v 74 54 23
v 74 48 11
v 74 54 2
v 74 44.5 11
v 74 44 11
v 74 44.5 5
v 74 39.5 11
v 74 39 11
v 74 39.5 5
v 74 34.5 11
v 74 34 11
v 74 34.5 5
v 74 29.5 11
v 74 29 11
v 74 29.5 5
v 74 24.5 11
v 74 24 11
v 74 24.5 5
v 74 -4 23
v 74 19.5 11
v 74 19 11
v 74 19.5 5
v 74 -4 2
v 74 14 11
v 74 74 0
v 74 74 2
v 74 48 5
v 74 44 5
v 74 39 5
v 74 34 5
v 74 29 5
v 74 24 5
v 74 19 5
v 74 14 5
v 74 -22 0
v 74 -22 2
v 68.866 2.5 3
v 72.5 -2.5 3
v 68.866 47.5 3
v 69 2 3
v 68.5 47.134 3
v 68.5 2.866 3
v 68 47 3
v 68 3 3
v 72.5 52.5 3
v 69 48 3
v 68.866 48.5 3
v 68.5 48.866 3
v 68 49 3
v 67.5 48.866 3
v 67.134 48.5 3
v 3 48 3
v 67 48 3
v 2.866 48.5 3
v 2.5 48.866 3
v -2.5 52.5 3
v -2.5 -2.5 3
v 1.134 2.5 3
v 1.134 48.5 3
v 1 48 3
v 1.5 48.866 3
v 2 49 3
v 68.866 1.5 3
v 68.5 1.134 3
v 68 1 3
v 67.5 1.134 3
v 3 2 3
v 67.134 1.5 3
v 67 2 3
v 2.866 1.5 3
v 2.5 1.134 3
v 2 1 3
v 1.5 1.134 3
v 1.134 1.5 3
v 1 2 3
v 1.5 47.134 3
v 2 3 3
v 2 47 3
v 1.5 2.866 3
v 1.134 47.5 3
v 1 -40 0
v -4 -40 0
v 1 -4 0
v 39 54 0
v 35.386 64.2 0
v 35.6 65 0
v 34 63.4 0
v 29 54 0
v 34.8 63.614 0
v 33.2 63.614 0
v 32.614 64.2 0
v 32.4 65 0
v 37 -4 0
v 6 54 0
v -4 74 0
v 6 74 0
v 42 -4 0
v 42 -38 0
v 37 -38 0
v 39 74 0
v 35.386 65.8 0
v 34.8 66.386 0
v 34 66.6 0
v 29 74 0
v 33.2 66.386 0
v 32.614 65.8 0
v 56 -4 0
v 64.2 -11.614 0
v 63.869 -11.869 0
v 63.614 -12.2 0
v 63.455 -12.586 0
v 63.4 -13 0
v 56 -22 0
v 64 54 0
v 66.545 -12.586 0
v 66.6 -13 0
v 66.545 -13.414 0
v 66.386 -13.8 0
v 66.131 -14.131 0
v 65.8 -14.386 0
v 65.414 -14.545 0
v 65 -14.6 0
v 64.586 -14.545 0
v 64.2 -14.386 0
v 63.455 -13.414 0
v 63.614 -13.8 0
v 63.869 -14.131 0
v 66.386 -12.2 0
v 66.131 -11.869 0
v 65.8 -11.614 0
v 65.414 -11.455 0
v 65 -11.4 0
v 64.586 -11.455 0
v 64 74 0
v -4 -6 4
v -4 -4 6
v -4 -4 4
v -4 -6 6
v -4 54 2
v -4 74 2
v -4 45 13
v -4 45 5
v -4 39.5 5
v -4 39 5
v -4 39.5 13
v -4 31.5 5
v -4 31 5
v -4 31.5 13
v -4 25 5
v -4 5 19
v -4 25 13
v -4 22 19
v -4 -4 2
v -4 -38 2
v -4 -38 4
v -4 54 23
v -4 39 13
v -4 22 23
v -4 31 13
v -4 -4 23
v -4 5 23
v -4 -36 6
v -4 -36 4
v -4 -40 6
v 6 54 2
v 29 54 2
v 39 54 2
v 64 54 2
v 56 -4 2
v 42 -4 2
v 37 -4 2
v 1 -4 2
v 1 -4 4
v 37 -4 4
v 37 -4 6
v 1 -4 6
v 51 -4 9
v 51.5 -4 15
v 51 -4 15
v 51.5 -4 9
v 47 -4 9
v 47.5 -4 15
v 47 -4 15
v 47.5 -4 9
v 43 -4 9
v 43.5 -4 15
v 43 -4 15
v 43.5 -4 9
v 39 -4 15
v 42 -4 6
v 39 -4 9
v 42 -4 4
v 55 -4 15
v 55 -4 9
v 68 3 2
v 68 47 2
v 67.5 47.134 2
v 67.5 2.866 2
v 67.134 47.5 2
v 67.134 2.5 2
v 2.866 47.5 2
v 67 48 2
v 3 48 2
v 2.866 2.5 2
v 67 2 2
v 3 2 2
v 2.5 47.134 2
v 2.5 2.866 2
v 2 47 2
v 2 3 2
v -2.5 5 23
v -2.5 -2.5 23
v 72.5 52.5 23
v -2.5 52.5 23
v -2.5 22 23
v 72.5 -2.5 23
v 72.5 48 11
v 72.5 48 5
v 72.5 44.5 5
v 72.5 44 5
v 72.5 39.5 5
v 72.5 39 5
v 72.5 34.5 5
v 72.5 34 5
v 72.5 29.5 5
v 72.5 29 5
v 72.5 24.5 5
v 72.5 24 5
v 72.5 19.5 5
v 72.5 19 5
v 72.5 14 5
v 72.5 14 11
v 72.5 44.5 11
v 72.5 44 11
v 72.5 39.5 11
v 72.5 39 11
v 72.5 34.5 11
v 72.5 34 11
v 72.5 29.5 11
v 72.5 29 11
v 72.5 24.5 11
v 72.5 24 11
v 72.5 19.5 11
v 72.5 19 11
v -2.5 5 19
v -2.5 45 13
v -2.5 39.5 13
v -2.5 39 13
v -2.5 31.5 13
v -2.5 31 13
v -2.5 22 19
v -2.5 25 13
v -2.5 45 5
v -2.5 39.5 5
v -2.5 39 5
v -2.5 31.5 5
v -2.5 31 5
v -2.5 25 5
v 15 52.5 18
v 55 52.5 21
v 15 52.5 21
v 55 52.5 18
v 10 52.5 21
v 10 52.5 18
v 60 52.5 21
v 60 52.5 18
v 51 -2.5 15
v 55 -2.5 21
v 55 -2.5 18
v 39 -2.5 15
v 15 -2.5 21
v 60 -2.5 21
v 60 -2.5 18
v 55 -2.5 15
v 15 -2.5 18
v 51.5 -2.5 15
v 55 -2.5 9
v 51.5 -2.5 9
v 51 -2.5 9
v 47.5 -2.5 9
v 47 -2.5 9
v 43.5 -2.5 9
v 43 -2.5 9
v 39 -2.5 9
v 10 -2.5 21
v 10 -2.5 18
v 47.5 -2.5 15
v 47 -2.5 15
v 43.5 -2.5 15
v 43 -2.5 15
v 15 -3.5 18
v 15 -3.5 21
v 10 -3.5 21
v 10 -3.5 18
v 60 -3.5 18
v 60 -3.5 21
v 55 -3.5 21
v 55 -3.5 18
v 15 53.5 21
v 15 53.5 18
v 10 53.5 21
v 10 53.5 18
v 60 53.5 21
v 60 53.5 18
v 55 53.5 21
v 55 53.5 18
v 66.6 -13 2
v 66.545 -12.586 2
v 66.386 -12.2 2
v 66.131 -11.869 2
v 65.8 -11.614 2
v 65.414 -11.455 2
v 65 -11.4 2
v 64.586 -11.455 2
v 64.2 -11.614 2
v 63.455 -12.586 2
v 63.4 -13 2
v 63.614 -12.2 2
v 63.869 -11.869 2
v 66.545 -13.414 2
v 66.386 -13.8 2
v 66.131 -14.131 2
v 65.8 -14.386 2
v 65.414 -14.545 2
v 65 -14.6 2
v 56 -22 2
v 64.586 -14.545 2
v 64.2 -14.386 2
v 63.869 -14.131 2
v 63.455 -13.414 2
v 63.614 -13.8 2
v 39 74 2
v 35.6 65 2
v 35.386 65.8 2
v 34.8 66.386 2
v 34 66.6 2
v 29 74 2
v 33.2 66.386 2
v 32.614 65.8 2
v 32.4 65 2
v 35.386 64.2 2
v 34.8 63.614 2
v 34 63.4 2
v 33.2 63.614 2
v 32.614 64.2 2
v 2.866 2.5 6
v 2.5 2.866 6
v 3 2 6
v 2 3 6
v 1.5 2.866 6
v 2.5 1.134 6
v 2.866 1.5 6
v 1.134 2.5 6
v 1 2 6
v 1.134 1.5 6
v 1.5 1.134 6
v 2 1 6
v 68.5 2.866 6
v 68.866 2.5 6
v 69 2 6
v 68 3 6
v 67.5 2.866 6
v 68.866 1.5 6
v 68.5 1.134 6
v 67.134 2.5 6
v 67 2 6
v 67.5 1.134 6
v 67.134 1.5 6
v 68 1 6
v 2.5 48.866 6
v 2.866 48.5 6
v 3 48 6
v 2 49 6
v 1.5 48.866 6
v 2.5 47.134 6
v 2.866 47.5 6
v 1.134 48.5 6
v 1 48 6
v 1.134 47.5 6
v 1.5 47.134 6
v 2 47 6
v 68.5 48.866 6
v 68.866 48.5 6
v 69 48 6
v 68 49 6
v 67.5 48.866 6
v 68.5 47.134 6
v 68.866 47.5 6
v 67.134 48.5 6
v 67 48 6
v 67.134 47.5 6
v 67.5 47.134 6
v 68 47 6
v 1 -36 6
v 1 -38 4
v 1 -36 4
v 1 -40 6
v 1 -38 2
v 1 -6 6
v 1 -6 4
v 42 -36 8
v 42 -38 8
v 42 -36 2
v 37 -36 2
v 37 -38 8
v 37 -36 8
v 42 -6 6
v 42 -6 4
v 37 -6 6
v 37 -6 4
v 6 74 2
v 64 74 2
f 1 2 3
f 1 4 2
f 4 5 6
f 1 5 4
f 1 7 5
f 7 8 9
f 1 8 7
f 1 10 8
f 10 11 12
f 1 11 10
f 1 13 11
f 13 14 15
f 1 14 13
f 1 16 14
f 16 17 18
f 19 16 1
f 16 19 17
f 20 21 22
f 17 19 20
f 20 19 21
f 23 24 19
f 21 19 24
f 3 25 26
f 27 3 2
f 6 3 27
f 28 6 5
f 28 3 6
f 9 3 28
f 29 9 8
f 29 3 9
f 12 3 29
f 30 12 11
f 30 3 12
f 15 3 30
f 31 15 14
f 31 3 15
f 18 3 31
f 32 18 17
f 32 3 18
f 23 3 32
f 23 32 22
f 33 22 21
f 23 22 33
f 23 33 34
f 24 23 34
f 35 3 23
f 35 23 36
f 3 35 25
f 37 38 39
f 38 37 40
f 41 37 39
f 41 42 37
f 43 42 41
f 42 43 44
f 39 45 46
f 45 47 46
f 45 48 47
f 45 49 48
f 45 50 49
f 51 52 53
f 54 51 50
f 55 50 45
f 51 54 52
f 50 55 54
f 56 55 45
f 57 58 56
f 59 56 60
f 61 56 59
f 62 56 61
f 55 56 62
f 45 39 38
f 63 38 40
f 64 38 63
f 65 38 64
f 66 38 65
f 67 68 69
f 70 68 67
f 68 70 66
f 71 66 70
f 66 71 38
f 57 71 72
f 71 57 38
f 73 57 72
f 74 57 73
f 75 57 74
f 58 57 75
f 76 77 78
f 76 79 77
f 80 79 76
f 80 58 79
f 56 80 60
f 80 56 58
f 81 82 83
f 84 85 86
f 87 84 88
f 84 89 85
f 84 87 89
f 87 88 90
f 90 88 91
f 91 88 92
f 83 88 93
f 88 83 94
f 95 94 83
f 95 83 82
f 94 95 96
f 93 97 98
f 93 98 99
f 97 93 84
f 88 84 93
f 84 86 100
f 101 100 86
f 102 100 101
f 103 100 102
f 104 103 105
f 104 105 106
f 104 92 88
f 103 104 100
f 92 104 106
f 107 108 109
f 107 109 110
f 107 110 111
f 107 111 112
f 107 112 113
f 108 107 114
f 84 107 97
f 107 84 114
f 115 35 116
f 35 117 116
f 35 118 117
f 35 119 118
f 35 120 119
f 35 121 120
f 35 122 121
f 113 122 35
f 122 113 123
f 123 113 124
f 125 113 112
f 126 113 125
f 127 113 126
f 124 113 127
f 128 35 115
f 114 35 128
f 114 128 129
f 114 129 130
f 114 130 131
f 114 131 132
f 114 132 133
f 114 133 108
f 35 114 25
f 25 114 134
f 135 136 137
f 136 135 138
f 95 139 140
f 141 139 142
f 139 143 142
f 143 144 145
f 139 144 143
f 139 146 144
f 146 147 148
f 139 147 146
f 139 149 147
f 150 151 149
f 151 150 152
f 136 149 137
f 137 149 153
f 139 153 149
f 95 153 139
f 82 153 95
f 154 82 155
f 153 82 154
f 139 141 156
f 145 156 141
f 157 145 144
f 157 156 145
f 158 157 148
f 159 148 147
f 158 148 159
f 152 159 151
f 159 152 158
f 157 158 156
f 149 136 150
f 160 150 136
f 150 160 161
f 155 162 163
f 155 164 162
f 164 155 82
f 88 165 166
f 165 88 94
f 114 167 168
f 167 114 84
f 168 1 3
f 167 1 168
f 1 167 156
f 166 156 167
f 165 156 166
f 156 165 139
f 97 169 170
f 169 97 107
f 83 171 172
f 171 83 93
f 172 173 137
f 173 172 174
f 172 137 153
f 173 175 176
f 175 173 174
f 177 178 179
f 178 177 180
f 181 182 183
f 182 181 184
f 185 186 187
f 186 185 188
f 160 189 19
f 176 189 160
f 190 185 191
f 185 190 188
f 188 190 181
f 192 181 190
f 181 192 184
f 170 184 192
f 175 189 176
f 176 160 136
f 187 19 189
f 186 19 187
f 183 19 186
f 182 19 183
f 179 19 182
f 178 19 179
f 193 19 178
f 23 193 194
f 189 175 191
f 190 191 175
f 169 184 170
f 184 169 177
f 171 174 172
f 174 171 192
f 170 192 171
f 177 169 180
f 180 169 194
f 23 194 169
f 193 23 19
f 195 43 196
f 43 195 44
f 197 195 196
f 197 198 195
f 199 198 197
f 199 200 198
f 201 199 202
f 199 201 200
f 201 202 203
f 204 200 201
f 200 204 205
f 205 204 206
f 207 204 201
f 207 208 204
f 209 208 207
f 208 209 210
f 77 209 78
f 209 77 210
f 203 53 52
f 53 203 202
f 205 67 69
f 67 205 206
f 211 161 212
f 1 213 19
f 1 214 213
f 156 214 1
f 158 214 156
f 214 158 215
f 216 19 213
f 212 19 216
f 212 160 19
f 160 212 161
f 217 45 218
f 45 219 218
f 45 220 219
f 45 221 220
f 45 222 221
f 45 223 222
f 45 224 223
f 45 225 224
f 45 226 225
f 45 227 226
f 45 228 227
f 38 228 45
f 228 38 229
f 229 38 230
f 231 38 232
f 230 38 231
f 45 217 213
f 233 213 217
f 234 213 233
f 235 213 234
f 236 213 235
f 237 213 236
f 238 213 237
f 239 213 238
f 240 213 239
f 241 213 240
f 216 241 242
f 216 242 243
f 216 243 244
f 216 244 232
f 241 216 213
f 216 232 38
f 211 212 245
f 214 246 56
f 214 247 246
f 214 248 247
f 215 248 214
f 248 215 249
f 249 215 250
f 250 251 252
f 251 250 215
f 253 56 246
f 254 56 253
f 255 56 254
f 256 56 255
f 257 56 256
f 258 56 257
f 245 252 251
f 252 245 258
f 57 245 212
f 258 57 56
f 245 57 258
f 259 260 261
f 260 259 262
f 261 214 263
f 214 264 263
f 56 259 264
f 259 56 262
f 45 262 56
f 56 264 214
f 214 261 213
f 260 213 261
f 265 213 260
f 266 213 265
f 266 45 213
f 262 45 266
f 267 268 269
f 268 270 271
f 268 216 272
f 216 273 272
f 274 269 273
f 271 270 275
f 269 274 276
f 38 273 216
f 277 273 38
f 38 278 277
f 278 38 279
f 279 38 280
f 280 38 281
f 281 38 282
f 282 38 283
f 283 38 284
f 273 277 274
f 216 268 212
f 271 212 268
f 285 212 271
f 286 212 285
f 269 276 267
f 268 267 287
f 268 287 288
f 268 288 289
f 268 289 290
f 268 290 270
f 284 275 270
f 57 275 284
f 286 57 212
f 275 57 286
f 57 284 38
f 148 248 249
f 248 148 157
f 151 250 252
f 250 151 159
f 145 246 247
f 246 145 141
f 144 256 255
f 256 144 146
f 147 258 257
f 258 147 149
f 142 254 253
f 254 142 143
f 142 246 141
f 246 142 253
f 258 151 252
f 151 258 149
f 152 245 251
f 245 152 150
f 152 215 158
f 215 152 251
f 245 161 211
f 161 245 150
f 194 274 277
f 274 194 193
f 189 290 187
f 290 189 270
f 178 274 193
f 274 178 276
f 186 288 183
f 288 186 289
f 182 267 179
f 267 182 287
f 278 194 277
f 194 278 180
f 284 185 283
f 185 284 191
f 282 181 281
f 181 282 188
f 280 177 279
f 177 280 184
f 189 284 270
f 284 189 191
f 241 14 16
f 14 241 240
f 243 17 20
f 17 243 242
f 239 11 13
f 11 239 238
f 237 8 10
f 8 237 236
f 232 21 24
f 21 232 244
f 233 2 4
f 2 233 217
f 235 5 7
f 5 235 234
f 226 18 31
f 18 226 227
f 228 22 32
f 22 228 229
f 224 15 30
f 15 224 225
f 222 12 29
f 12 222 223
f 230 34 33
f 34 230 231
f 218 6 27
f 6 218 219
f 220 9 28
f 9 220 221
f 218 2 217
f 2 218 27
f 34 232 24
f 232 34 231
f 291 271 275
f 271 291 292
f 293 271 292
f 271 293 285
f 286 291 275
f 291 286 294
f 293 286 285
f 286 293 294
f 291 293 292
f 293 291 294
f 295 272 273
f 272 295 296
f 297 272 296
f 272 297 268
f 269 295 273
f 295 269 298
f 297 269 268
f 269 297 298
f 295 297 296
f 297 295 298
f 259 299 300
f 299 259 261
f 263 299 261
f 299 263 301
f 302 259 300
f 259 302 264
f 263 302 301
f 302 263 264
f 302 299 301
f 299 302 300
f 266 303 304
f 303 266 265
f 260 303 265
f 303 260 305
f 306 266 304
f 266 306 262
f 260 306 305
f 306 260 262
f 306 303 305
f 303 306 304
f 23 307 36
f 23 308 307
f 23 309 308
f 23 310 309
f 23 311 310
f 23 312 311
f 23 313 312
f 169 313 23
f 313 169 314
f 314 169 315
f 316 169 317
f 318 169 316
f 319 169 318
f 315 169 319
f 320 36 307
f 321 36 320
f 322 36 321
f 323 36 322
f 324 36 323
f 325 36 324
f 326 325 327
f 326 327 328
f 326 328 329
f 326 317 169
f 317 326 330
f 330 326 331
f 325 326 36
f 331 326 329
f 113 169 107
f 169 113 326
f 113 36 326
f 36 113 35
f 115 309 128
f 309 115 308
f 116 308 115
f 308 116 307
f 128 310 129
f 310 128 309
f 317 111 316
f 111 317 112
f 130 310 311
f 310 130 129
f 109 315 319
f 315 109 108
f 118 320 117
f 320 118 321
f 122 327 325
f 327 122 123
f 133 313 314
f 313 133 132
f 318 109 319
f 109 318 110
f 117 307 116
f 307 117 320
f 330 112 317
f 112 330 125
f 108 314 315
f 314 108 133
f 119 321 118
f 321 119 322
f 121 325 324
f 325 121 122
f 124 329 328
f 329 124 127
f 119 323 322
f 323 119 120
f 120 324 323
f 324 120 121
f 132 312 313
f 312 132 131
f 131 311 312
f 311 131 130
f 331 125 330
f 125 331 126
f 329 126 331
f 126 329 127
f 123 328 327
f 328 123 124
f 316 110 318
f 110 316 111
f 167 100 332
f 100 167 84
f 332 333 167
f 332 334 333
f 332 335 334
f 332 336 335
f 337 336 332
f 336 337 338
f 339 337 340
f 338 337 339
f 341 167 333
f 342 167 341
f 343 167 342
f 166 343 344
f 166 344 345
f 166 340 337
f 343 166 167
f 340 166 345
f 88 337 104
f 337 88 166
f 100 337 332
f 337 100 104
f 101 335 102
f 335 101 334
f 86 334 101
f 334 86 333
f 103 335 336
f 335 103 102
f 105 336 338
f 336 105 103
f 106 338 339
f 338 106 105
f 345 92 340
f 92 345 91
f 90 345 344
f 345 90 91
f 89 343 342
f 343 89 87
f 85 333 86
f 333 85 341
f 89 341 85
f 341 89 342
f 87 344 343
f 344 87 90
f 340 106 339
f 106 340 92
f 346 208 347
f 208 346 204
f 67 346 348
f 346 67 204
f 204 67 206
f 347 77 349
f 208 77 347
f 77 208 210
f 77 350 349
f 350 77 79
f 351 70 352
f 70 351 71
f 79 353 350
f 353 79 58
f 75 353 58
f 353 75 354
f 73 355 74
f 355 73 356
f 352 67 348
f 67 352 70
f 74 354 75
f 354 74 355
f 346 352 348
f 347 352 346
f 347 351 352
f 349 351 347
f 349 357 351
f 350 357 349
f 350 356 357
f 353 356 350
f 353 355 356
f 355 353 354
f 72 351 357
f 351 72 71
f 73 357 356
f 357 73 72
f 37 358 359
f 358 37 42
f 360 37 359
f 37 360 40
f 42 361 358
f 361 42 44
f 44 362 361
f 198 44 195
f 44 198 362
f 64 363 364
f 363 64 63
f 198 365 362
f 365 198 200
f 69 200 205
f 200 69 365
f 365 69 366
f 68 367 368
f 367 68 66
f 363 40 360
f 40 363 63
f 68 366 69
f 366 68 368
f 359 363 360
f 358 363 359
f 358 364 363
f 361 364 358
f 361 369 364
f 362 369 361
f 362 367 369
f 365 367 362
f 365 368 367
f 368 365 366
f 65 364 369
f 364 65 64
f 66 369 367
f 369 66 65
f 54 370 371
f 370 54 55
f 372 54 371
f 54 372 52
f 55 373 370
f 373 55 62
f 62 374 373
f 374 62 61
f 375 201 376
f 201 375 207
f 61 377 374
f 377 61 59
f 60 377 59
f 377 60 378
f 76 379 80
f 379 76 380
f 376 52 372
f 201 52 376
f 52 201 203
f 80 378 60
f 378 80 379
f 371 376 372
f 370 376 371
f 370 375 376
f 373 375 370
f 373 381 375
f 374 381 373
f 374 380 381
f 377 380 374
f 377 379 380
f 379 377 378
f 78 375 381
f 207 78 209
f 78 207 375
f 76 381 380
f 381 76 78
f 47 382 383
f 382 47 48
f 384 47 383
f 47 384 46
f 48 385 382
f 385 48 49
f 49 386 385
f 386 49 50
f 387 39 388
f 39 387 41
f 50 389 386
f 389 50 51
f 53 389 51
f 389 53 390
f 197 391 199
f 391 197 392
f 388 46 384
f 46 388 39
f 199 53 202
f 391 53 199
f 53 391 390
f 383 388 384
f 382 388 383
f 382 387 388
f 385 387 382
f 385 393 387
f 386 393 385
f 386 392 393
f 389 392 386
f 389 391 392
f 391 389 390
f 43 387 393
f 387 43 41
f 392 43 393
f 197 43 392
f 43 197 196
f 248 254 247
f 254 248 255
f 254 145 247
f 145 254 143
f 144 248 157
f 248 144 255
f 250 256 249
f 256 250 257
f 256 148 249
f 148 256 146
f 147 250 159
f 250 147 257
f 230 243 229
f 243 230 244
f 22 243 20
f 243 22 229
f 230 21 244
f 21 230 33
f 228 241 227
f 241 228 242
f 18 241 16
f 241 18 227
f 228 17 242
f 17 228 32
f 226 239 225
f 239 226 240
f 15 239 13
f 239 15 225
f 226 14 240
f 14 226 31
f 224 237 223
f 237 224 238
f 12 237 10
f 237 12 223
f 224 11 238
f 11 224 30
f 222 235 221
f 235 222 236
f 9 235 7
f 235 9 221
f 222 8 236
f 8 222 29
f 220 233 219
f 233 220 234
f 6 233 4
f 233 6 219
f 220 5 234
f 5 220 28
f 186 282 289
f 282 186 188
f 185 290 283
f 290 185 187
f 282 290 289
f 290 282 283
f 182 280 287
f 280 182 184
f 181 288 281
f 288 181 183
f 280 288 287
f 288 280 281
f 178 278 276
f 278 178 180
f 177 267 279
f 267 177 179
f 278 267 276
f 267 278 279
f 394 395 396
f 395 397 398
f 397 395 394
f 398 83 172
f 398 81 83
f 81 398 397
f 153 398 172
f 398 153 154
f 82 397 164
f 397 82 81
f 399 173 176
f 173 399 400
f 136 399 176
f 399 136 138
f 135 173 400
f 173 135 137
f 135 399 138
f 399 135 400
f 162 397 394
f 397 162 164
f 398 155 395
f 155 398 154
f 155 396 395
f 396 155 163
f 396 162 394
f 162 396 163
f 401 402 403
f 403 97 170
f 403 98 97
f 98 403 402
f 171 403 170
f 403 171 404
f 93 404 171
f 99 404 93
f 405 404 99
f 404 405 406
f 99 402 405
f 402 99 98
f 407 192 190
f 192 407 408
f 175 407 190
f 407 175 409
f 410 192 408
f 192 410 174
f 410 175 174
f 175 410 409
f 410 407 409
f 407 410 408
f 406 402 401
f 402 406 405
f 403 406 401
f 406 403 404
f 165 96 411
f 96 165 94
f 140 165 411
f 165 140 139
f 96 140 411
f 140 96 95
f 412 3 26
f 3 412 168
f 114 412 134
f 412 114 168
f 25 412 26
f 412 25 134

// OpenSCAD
thickness=2.5;

difference()
{
    translate([-4,-4,0])
        cube(size=[70+4*2,50+4*2,3]);
    translate([0+2,0+2,2])
        cube(size=[70-4,50-4,1]);
}


translate([0+2,0+2,0])
    cylinder(d=2,h=6,$fn=12);
translate([70-2,0+2,0])
    cylinder(d=2,h=6,$fn=12);
translate([0+2,50-2,0])
    cylinder(d=2,h=6,$fn=12);
translate([70-2,50-2,0])
    cylinder(d=2,h=6,$fn=12);

difference()
{

    difference()
    {
        translate([-4,-4,3])
            cube(size=[70+4*2,50+4*2,20]);
        translate([-thickness,-thickness,3])
            cube(size=[70+thickness*2,50+thickness*2,20]);
    }

    
    union()
    {
        translate([-4,25,5])
            cube([3,20,8]);
        translate([-4,5,3+16])
            cube([3,17,4]);
        
        translate([39,-4,9])
            cube([16,4,6]);
        
        translate([70,14,5])
            cube([4,34,6]);
        
        
        translate([10,-3.5,18])
            cube([5,1,3]);
        translate([70-10-5,-3.5,18])
            cube([5,1,3]);
        translate([10,50+2.5,18])
            cube([5,1,3]);
        translate([70-10-5,50+2.5,18])
            cube([5,1,3]);
    }
}


translate([-4,25+14,5])
    cube([1.5,0.5,8]);
translate([-4,25+6,5])
    cube([1.5,0.5,8]);

translate([70+2.5,14+5,5])
    cube([1.5,0.5,6]);
translate([70+2.5,14+10,5])
    cube([1.5,0.5,6]);
translate([70+2.5,14+15,5])
    cube([1.5,0.5,6]);
translate([70+2.5,14+20,5])
    cube([1.5,0.5,6]);
translate([70+2.5,14+25,5])
    cube([1.5,0.5,6]);
translate([70+2.5,14+30,5])
    cube([1.5,0.5,6]);

translate([39+4,-4,9])
    cube([0.5,1.5,6]);
translate([39+8,-4,9])
    cube([0.5,1.5,6]);
translate([39+12,-4,9])
    cube([0.5,1.5,6]);

difference()
{
    translate([70-18+4,-4-18,0])
        cube(size=[18,20,2]);

    translate([70-18+4+9,-4-18+9,0])
        cylinder(d=3.2,h=3,$fn=24);
}


translate([-4,-4-34-2,0])
    cube([5,34+2,2]);
translate([-4,-4-2,4])
    cube([5,2,2]);
translate([-4,-4-34-2,2])
    cube([5,2,4]);
translate([-4,-4-34,4])
    cube([5,2,2]);


translate([-4+46-5,-4-34,0])
    cube([5,34,2]);
translate([-4+46-5,-4-2,4])
    cube([5,2,2]);
translate([-4+46-5,-4-34,2])
    cube([5,2,6]);


translate([-4,50+4,0])
    cube([10,20,2]);
translate([-4+70-2,50+4,0])
    cube([10,20,2]);

difference()
{
    translate([-4+38-5,50+4,0])
        cube([10,20,2]);
    
    translate([-4+38,50+4+11,0])
        cylinder(d=3.2,h=3,$fn=12);
}
